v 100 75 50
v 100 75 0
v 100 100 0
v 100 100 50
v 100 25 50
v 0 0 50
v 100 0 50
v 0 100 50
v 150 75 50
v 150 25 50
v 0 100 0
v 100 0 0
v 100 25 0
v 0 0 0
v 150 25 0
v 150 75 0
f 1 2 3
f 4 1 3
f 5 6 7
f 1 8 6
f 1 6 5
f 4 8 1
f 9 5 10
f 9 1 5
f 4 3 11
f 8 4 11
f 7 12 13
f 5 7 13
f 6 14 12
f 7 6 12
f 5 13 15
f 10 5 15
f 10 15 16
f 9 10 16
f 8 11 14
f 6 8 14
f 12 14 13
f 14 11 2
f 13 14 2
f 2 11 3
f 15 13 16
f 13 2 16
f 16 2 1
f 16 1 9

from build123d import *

# Parameters (mm, degrees)
SCHIZZO1_W                   = 50
SCHIZZO1_H                   = 50
ESTRUSIONE_ESTRUSIONE1_DEPTH = 50


with BuildPart() as part:
    # Schizzo1 → Estrusione-Estrusione1 (new body)
    with BuildSketch(Plane.XY):
        with Locations((25, 75)):
            Rectangle(SCHIZZO1_W, SCHIZZO1_H)
        with Locations((25, 25)):
            Rectangle(SCHIZZO1_W, SCHIZZO1_H)
        Polygon((50, 50), (50, 0), (100, 0), (100, 25), (100, 50), align=None)
        Polygon((50, 100), (50, 50), (100, 50), (100, 75), (100, 100), align=None)
        with Locations((125, 50)):
            Rectangle(SCHIZZO1_W, SCHIZZO1_H)
    extrude(amount=ESTRUSIONE_ESTRUSIONE1_DEPTH)


solid = part.part
